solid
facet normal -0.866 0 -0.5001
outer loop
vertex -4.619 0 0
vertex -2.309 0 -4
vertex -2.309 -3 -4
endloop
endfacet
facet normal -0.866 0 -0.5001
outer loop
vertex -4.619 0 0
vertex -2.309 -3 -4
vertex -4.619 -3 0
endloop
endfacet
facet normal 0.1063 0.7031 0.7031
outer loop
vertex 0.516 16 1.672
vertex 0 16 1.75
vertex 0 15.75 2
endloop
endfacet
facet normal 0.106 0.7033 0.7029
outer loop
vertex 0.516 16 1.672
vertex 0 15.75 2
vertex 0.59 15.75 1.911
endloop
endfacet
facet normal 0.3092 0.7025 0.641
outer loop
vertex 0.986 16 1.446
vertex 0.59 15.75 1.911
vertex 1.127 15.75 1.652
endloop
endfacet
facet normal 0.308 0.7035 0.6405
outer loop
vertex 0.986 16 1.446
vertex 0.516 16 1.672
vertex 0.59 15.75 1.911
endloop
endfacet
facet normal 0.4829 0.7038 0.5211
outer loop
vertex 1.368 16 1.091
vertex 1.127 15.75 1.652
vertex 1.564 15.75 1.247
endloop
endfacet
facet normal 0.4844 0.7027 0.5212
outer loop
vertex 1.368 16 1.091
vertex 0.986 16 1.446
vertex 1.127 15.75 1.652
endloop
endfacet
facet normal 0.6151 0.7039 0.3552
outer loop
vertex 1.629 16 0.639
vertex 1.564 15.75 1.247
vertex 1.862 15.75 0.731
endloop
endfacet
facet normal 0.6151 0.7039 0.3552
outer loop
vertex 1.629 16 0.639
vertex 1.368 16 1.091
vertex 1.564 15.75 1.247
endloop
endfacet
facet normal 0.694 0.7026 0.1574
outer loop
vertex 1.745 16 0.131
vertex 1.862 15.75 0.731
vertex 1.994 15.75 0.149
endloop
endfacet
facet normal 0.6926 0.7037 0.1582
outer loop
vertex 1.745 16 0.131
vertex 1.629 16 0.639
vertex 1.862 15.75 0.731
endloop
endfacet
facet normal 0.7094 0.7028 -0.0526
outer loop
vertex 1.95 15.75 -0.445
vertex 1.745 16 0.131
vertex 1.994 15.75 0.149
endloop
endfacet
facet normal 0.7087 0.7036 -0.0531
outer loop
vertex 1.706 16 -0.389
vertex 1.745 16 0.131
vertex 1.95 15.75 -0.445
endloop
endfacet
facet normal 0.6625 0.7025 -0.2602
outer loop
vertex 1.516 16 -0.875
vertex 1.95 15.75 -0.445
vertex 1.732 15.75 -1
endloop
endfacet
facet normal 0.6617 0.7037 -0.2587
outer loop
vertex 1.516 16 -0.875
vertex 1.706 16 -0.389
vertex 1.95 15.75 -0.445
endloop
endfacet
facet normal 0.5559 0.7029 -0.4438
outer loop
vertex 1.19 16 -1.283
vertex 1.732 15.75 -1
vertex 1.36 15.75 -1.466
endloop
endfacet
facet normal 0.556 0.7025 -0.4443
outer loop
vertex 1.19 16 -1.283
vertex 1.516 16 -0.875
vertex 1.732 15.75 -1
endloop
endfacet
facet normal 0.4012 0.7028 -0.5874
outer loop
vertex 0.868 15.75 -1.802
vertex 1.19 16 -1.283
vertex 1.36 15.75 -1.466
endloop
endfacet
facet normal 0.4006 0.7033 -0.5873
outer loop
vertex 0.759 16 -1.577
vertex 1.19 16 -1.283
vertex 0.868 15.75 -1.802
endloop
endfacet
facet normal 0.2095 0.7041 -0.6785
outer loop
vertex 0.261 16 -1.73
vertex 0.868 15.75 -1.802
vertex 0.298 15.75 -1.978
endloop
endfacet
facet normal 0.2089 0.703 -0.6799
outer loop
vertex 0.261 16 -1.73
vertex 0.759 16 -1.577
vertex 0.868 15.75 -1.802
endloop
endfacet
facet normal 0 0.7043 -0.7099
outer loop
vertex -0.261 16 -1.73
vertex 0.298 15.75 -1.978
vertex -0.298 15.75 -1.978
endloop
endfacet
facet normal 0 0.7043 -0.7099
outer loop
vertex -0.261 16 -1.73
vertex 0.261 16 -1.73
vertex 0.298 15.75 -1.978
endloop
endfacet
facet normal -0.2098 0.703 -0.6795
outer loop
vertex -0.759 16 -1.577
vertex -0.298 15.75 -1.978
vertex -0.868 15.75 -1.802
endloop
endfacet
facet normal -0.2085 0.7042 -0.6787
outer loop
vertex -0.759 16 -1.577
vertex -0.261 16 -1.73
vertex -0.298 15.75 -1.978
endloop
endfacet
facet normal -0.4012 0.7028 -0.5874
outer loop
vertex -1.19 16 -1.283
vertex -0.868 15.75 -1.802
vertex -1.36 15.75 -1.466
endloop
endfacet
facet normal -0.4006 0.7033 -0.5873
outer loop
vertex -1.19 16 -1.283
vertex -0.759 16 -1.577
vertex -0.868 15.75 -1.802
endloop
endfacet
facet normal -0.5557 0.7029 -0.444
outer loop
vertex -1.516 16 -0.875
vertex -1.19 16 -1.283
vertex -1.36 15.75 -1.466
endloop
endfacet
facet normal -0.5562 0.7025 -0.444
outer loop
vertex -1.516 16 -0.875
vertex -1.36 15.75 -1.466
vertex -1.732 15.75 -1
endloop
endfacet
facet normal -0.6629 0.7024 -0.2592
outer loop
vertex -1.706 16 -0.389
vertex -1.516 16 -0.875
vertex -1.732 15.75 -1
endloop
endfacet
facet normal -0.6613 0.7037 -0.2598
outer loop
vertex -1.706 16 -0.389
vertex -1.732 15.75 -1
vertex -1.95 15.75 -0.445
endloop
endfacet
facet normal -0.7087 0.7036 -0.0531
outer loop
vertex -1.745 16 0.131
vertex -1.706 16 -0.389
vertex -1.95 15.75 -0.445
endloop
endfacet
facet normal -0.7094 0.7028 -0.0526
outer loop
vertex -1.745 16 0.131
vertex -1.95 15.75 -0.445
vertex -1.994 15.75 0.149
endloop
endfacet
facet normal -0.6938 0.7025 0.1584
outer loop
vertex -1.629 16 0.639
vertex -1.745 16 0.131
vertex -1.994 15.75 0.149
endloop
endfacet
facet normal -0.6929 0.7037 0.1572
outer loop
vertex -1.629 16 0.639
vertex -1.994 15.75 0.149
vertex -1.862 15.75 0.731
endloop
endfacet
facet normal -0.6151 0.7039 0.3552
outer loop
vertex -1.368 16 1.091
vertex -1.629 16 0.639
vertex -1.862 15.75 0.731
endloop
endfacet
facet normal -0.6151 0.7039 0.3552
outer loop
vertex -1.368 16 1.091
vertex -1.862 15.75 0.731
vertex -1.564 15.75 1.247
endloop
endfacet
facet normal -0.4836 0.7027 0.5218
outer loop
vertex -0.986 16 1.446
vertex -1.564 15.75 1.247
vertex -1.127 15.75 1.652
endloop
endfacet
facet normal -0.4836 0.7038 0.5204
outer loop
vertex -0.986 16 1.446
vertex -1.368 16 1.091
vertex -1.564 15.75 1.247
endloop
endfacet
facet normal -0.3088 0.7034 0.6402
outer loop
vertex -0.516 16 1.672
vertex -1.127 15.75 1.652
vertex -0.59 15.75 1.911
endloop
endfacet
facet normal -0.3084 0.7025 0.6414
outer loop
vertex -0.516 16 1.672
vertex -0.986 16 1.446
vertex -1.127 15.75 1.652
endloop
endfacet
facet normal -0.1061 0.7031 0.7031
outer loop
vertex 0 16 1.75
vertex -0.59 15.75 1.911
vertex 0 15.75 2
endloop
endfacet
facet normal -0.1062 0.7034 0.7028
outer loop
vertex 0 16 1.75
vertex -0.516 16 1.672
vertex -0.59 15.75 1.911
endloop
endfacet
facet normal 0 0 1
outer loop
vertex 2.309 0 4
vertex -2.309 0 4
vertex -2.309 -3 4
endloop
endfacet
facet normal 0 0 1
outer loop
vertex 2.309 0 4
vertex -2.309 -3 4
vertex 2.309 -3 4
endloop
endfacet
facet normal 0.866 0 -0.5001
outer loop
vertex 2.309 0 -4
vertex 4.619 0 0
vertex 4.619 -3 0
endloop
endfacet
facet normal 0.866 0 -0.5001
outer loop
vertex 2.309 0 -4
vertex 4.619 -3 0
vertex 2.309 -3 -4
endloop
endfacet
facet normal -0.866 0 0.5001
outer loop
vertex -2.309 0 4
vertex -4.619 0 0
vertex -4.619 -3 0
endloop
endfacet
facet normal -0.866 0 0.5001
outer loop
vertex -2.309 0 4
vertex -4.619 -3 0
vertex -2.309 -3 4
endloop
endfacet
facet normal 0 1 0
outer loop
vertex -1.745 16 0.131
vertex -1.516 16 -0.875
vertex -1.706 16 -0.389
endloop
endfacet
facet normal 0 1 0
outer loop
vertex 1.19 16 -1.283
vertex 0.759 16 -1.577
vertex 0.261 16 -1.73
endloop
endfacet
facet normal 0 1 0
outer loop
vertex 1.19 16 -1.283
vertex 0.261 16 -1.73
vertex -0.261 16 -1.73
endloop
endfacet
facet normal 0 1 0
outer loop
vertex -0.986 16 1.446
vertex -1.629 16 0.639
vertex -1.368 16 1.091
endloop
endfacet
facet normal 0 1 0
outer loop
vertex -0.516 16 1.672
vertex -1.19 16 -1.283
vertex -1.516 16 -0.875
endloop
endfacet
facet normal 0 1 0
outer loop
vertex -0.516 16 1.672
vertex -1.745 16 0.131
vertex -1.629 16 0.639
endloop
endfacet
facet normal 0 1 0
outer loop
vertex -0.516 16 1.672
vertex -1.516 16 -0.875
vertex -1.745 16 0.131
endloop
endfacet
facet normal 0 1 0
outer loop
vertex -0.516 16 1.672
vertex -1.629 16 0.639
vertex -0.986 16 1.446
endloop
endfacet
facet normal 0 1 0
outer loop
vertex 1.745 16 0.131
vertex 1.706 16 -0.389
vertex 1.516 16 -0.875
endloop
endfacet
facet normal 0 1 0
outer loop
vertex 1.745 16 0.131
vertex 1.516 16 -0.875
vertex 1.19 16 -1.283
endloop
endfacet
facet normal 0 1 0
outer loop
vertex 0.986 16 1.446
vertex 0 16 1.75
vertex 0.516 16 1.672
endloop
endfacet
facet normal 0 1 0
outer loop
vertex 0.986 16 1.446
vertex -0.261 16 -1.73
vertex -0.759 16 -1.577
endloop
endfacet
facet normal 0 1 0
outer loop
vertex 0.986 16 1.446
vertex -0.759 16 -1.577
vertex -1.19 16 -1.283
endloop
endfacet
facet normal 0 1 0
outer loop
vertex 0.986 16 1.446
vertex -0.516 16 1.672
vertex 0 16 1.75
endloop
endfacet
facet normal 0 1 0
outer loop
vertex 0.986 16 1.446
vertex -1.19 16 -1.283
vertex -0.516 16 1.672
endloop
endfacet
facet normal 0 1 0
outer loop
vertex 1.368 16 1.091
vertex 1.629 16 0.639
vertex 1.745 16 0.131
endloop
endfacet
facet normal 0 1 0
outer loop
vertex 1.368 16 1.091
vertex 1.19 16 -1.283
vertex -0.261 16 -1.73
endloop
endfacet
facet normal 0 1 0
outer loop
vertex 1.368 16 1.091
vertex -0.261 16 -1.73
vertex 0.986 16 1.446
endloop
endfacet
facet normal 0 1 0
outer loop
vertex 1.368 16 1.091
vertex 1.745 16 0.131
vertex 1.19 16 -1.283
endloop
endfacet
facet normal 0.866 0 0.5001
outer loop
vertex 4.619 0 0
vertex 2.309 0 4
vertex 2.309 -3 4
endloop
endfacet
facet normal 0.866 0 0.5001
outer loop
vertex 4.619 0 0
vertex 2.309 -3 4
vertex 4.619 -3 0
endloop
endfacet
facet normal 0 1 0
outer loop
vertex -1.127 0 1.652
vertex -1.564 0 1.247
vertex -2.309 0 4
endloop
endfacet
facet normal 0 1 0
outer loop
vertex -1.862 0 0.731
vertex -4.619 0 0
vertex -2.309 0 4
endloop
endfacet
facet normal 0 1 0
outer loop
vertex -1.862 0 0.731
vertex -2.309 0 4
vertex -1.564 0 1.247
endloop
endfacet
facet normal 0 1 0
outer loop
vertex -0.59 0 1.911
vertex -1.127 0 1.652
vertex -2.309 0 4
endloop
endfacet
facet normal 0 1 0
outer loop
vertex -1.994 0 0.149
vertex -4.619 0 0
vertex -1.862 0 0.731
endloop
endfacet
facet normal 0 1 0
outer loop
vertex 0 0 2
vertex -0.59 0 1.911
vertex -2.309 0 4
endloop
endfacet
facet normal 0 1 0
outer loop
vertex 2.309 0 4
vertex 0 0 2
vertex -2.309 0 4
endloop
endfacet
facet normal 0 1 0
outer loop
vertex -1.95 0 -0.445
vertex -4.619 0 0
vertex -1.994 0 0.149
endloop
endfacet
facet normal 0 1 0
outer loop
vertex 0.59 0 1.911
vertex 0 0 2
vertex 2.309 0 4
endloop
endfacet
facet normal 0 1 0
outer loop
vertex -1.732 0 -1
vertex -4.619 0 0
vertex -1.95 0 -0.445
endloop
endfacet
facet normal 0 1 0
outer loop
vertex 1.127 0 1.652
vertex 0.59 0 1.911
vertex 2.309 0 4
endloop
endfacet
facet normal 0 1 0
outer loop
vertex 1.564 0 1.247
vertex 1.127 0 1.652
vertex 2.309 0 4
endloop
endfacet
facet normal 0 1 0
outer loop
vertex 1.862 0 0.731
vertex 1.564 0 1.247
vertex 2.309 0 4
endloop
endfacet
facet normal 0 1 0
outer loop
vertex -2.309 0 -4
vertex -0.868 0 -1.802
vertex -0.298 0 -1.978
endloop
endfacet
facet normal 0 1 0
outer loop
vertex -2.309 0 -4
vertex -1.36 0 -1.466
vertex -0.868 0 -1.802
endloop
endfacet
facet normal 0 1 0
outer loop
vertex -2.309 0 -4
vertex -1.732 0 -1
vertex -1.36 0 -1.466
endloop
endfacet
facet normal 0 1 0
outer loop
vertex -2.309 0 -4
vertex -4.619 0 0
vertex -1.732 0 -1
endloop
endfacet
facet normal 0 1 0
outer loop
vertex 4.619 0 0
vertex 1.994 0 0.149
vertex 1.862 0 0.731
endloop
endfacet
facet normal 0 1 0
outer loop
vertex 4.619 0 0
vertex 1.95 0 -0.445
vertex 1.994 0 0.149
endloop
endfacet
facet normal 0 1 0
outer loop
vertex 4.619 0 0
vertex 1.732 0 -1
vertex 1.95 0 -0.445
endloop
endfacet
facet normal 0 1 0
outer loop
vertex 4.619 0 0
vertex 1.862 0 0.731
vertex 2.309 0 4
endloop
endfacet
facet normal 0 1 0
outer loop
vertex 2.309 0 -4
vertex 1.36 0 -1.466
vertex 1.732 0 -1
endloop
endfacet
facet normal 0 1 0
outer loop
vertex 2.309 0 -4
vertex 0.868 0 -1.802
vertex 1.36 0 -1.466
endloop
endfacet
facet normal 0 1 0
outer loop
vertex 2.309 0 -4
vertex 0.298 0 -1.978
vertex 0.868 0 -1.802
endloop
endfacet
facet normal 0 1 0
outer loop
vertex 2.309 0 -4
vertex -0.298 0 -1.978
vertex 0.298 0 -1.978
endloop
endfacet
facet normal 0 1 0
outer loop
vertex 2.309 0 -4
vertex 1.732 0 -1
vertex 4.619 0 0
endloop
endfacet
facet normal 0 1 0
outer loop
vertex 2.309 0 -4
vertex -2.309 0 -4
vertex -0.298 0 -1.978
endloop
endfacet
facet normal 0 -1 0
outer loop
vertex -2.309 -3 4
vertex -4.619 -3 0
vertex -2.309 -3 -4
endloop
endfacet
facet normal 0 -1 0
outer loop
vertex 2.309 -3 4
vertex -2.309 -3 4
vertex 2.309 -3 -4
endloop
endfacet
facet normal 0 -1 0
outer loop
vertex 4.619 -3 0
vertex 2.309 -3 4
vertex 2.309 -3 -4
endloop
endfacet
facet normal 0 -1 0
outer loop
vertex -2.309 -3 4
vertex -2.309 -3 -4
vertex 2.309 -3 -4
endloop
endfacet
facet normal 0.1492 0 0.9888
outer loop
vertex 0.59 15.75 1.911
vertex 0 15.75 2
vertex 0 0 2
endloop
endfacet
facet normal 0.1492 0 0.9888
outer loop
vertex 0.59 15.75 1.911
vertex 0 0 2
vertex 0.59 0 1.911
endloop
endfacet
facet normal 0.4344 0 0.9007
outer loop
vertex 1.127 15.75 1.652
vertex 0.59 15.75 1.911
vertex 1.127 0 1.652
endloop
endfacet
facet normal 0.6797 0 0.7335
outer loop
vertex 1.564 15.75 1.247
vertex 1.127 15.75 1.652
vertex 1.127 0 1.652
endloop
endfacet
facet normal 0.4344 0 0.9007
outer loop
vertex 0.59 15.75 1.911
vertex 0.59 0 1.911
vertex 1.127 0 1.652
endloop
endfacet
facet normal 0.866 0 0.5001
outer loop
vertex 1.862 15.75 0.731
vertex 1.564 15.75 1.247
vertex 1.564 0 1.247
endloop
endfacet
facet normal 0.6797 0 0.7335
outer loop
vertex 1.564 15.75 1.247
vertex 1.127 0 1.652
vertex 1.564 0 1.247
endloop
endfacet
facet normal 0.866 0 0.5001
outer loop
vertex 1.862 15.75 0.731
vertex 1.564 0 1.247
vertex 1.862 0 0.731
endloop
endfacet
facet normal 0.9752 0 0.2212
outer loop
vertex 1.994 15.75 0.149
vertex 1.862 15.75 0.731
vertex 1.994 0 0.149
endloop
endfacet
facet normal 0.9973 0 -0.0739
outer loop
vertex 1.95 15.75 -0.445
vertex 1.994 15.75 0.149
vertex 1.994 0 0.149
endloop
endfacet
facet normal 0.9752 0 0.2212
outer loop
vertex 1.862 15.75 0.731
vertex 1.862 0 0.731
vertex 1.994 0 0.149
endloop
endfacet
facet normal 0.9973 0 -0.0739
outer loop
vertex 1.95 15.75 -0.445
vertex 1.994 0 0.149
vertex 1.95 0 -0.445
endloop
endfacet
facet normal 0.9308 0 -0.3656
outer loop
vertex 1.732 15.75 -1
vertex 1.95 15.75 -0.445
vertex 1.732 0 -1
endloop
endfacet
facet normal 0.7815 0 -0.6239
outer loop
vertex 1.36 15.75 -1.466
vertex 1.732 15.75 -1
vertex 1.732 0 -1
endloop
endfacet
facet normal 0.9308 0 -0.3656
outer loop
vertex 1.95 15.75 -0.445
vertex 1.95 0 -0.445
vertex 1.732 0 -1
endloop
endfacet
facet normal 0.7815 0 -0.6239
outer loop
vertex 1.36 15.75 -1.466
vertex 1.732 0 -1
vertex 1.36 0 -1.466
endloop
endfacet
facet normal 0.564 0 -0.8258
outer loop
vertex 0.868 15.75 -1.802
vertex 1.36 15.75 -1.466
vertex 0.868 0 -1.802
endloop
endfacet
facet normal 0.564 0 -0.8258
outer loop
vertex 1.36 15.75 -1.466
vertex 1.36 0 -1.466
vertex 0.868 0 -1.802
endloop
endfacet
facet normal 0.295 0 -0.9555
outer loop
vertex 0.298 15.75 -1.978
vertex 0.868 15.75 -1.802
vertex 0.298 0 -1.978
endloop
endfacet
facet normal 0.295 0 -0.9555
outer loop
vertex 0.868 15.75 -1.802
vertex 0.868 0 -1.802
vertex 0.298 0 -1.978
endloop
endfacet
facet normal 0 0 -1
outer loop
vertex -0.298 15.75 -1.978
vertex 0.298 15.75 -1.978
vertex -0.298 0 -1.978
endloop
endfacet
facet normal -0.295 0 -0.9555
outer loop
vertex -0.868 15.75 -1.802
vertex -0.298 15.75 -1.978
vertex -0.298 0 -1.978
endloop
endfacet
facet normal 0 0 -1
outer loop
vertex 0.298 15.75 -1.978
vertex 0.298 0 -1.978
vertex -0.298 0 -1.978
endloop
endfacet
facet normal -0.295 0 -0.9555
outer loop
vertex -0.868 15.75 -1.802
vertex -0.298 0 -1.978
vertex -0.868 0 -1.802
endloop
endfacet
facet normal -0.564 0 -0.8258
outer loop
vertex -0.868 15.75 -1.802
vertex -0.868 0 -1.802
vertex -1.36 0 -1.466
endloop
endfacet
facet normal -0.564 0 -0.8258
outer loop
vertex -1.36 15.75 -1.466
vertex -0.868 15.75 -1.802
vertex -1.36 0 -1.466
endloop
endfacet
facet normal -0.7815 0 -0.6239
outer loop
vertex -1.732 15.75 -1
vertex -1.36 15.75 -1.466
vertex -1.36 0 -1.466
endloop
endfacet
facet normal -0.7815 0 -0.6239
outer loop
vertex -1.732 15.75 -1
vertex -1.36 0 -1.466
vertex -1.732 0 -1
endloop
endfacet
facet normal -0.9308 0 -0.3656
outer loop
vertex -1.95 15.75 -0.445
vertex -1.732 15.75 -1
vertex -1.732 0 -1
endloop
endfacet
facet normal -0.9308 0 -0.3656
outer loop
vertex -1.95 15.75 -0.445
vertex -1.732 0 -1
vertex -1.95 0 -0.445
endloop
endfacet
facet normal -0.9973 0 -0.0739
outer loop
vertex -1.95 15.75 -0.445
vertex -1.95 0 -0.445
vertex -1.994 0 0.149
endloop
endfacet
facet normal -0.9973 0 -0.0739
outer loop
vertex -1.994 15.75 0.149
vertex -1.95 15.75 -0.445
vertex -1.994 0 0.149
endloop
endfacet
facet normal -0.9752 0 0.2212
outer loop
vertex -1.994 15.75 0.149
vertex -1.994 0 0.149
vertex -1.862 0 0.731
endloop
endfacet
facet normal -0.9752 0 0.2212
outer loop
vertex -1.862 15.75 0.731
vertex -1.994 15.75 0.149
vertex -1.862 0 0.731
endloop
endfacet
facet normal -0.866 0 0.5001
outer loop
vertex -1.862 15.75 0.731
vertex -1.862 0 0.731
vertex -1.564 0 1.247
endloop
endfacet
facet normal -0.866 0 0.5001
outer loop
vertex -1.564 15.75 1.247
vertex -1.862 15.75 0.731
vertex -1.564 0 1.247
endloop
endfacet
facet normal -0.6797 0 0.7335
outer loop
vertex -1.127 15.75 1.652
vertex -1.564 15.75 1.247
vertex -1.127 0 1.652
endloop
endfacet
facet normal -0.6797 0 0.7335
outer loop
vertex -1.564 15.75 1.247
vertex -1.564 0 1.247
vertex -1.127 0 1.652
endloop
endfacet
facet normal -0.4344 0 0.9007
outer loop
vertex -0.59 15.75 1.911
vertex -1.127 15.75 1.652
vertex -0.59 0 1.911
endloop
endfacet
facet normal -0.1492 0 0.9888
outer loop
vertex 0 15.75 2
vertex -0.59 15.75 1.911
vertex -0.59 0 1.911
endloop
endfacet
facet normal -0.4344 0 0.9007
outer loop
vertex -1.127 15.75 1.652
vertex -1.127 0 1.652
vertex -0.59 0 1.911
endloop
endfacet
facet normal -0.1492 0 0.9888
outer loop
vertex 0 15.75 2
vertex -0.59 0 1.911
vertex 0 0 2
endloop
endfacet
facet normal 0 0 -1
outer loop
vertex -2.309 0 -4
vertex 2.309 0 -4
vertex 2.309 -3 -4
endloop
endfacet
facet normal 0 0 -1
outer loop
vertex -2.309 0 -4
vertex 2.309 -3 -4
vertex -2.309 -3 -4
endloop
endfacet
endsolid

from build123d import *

# Parameters (mm, degrees)
BOSS_EXTRUDE1_DEPTH = 3
SKETCH2_R           = 2
BOSS_EXTRUDE2_DEPTH = 16
CHAMFER1_SIZE       = 0.25


with BuildPart() as part:
    # Sketch1 → Boss-Extrude1 (new body)
    with BuildSketch(Plane(origin=(0, 0, 0), x_dir=(1, 0, 0), z_dir=(0, 1, 0))):
        Polygon((4.618802154, 0), (2.309401077, 4), (-2.309401077, 4), (-4.618802154, 0), (-2.309401077, -4), (2.309401077, -4), align=None)
    extrude(amount=-BOSS_EXTRUDE1_DEPTH)

    # Sketch2 → Boss-Extrude2 (add)
    with BuildSketch(Plane(origin=(0, 0, 0), x_dir=(1, 0, 0), z_dir=(0, 1, 0))):
        with Locations(Location((0, 0, 0), (0, 0, 270))):
            Circle(SKETCH2_R)
    extrude(amount=BOSS_EXTRUDE2_DEPTH)

    # Chamfer1
    chamfer1_edges = [part.edges().sort_by_distance(p)[0] for p in [
        (0, 16, -2),
    ]]
    chamfer(chamfer1_edges, length=CHAMFER1_SIZE)


solid = part.part
